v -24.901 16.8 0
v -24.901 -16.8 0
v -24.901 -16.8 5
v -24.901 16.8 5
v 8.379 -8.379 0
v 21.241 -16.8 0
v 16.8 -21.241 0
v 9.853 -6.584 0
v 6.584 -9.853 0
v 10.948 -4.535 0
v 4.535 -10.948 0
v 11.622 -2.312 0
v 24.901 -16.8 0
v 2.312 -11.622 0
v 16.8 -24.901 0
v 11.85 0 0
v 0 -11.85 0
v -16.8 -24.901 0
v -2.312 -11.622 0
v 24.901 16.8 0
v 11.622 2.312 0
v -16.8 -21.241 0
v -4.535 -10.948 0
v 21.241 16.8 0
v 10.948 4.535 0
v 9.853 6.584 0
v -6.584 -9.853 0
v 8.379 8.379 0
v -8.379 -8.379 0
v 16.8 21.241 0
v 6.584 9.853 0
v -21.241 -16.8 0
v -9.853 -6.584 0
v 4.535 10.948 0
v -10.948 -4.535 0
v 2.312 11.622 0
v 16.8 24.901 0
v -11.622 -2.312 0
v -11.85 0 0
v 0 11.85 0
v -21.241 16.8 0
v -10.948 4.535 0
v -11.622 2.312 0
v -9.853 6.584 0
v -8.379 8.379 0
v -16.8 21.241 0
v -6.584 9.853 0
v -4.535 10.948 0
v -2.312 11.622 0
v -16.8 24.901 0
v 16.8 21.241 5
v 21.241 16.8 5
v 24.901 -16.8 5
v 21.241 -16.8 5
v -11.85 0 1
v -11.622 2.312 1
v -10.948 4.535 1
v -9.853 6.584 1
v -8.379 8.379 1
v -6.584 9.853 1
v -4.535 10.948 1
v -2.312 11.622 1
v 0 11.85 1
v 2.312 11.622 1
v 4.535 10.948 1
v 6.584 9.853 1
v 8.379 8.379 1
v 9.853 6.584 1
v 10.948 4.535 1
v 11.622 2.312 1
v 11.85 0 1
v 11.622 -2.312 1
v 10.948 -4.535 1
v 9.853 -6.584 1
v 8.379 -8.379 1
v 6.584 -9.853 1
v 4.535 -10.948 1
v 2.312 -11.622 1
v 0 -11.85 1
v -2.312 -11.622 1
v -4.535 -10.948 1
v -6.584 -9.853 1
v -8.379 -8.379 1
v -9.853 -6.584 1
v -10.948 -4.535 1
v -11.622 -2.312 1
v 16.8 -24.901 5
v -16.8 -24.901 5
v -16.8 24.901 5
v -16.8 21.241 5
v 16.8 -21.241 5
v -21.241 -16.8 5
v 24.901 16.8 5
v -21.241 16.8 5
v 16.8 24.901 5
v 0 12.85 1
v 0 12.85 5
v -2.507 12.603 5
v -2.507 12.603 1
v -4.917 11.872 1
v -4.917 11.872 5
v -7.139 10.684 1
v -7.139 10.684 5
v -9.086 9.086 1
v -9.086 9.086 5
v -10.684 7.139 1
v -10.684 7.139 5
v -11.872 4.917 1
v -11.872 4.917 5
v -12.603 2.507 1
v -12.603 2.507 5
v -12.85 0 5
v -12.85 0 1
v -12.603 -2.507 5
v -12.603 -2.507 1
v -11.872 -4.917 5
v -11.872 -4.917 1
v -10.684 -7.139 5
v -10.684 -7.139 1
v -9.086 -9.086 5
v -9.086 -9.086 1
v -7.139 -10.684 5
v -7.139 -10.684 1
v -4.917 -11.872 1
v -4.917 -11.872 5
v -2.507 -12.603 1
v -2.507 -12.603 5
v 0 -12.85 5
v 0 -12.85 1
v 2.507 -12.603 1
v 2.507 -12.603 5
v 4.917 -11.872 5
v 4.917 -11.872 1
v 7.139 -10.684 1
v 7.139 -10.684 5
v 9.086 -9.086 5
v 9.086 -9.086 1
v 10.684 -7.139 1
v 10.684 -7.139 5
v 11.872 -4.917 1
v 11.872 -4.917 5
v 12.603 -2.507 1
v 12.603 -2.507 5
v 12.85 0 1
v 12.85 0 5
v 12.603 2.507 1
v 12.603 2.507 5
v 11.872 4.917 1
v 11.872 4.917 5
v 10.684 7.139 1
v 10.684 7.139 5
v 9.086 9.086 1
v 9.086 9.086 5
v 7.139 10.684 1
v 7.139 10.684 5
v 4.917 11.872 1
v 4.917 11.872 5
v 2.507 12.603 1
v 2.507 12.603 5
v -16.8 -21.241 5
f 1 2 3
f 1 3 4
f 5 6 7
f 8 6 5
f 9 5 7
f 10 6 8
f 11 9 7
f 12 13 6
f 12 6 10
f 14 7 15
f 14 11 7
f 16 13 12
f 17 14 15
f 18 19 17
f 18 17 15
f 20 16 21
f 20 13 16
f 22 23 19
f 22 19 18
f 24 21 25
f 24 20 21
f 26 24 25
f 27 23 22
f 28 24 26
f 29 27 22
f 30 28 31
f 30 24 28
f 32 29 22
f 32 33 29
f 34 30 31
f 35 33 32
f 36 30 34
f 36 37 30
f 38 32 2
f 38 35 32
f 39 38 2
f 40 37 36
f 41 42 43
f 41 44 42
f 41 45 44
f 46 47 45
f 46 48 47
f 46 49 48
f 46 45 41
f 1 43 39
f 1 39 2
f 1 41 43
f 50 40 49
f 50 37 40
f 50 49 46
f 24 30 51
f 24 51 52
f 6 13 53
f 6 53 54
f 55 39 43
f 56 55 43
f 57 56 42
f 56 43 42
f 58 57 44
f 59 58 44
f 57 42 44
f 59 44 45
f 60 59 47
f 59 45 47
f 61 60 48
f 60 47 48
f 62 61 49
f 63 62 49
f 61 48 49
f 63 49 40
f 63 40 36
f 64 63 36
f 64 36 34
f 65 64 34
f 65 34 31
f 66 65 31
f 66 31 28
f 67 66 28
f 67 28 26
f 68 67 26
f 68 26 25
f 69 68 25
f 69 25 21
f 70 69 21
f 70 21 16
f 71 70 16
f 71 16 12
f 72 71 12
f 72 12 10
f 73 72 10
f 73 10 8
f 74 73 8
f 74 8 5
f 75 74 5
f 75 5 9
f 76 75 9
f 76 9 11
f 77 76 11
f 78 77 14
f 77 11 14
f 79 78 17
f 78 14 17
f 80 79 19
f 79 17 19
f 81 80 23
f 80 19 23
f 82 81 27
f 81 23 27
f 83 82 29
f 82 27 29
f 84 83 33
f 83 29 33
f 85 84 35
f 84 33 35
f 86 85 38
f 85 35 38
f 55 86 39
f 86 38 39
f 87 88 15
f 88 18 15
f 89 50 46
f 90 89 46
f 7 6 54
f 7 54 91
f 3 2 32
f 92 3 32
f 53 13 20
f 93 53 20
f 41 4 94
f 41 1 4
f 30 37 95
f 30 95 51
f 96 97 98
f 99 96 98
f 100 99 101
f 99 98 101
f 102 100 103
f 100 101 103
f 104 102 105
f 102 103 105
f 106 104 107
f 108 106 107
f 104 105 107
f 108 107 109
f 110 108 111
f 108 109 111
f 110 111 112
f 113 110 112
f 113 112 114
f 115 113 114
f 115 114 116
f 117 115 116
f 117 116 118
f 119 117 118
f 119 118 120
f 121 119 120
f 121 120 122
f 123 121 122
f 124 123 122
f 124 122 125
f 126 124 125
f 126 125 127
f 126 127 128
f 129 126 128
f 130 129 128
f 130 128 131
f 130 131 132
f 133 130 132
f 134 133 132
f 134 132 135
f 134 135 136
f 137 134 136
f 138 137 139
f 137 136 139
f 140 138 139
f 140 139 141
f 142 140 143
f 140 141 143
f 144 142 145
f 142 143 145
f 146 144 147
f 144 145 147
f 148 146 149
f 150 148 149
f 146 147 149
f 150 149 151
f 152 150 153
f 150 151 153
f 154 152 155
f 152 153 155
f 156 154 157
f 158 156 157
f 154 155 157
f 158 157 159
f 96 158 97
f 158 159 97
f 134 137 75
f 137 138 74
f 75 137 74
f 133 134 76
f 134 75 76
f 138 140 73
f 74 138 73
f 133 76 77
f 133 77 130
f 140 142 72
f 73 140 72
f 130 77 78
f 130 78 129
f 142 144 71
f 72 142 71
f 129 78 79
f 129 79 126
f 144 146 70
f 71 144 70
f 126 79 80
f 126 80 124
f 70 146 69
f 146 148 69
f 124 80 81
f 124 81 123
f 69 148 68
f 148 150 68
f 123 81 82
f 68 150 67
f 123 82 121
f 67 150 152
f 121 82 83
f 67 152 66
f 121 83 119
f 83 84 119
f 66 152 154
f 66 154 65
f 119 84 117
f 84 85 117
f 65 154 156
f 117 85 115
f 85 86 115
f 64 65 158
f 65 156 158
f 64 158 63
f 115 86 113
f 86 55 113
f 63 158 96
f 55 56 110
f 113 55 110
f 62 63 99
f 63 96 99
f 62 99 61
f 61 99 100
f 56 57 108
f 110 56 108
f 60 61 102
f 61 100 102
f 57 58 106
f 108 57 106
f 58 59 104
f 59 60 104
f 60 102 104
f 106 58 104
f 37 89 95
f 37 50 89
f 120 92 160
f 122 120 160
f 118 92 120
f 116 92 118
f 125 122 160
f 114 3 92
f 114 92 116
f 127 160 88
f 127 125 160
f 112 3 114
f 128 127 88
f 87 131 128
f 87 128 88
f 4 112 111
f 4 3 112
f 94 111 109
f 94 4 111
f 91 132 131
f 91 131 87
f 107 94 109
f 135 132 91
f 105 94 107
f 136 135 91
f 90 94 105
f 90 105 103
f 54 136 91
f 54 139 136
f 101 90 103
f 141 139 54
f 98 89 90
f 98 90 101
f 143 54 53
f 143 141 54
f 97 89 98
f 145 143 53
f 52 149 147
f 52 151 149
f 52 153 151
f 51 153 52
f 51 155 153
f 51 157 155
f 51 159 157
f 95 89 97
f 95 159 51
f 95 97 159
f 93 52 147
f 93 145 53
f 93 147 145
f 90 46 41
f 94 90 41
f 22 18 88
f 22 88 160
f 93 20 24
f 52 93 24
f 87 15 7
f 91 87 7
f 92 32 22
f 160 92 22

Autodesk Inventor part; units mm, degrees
ref_plane "YZ Plane" through (0, 0, 0) normal (1, 0, 0) x (0, 1, 0)
ref_plane "XZ Plane" through (0, 0, 0) normal (0, 1, 0) x (-1, 0, 0)
ref_plane "XY Plane" through (0, 0, 0) normal (0, 0, 1) x (1, 0, 0)
sketch "Sketch1" plane through (0, 0, 0) normal (0, 0, 1) x (1, 0, 0)
  line L0 (-34.8609, 0) -> (34.8609, 0) construction
  line L1 (0, -34.8609) -> (0, 34.8609) construction
  line L2 (0, 0) -> (13.4339, 13.4339) construction
  line L3 (0, 0) -> (18.9985, 0) construction
  line L4 (0, 24.9006) -> (16.8, 24.9006)
  line L5 (16.8, 24.9006) -> (16.8, 21.2406)
  line L6 (16.8, 21.2406) -> (19.0203, 19.0203)
  line L7 (24.9006, 0) -> (24.9006, 16.8)
  line L8 (24.9006, 16.8) -> (21.2406, 16.8)
  line L9 (21.2406, 16.8) -> (19.0203, 19.0203)
  line L10 (0, 0) -> (-13.4339, 13.4339) construction
  line L11 (0, 0) -> (-18.9985, 0) construction
  line L12 (0, 24.9006) -> (-16.8, 24.9006)
  line L13 (-16.8, 24.9006) -> (-16.8, 21.2406)
  line L14 (-16.8, 21.2406) -> (-19.0203, 19.0203)
  line L15 (-24.9006, 0) -> (-24.9006, 16.8)
  line L16 (-24.9006, 16.8) -> (-21.2406, 16.8)
  line L17 (-21.2406, 16.8) -> (-19.0203, 19.0203)
  line L18 (0, 0) -> (13.4339, -13.4339) construction
  line L19 (0, -24.9006) -> (16.8, -24.9006)
  line L20 (16.8, -24.9006) -> (16.8, -21.2406)
  line L21 (16.8, -21.2406) -> (19.0203, -19.0203)
  line L22 (24.9006, 0) -> (24.9006, -16.8)
  line L23 (24.9006, -16.8) -> (21.2406, -16.8)
  line L24 (21.2406, -16.8) -> (19.0203, -19.0203)
  line L25 (0, 0) -> (-13.4339, -13.4339) construction
  line L26 (0, -24.9006) -> (-16.8, -24.9006)
  line L27 (-16.8, -24.9006) -> (-16.8, -21.2406)
  line L28 (-16.8, -21.2406) -> (-19.0203, -19.0203)
  line L29 (-24.9006, 0) -> (-24.9006, -16.8)
  line L30 (-24.9006, -16.8) -> (-21.2406, -16.8)
  line L31 (-21.2406, -16.8) -> (-19.0203, -19.0203)
  dimension "d0" = 45
  dimension "d1" = 3.14
  dimension "d2" = 3.66
  dimension "d3" = 16.8
extrude "Extrusion1" add sketch "Sketch1" along normal blind 5
hole "Hole1" at (0, 0, 0) direction (0, 0, 1) diameter 25.7 end through all
sketch "Sketch2" plane through (0, 0, 0) normal (0, 0, -1) x (-1, 0, 0)
  circle A0 centre (0, 0) radius 12.85 projected
  line L0 (16.8, 24.9006) -> (-16.8, 24.9006) projected
  line L1 (-16.8, 24.9006) -> (-16.8, 21.2406) projected
  line L2 (-16.8, 21.2406) -> (-21.2406, 16.8) projected
  line L3 (-21.2406, 16.8) -> (-24.9006, 16.8) projected
  line L4 (-24.9006, 16.8) -> (-24.9006, -16.8) projected
  line L5 (-24.9006, -16.8) -> (-21.2406, -16.8) projected
  line L6 (-21.2406, -16.8) -> (-16.8, -21.2406) projected
  line L7 (-16.8, -21.2406) -> (-16.8, -24.9006) projected
  line L8 (-16.8, -24.9006) -> (16.8, -24.9006) projected
  line L9 (16.8, -24.9006) -> (16.8, -21.2406) projected
  line L10 (16.8, -21.2406) -> (21.2406, -16.8) projected
  line L11 (21.2406, -16.8) -> (24.9006, -16.8) projected
  line L12 (24.9006, -16.8) -> (24.9006, 16.8) projected
  line L13 (24.9006, 16.8) -> (21.2406, 16.8) projected
  line L14 (21.2406, 16.8) -> (16.8, 21.2406) projected
  line L15 (16.8, 21.2406) -> (16.8, 24.9006) projected
  circle A1 centre (0, 0) radius 11.85
  dimension "d17" = 1
extrude "Extrusion2" add sketch "Sketch2" against normal blind 1 contours A0
equation "\"Lens_diameter\" = 25"
properties part number "20_Lens_holder"
